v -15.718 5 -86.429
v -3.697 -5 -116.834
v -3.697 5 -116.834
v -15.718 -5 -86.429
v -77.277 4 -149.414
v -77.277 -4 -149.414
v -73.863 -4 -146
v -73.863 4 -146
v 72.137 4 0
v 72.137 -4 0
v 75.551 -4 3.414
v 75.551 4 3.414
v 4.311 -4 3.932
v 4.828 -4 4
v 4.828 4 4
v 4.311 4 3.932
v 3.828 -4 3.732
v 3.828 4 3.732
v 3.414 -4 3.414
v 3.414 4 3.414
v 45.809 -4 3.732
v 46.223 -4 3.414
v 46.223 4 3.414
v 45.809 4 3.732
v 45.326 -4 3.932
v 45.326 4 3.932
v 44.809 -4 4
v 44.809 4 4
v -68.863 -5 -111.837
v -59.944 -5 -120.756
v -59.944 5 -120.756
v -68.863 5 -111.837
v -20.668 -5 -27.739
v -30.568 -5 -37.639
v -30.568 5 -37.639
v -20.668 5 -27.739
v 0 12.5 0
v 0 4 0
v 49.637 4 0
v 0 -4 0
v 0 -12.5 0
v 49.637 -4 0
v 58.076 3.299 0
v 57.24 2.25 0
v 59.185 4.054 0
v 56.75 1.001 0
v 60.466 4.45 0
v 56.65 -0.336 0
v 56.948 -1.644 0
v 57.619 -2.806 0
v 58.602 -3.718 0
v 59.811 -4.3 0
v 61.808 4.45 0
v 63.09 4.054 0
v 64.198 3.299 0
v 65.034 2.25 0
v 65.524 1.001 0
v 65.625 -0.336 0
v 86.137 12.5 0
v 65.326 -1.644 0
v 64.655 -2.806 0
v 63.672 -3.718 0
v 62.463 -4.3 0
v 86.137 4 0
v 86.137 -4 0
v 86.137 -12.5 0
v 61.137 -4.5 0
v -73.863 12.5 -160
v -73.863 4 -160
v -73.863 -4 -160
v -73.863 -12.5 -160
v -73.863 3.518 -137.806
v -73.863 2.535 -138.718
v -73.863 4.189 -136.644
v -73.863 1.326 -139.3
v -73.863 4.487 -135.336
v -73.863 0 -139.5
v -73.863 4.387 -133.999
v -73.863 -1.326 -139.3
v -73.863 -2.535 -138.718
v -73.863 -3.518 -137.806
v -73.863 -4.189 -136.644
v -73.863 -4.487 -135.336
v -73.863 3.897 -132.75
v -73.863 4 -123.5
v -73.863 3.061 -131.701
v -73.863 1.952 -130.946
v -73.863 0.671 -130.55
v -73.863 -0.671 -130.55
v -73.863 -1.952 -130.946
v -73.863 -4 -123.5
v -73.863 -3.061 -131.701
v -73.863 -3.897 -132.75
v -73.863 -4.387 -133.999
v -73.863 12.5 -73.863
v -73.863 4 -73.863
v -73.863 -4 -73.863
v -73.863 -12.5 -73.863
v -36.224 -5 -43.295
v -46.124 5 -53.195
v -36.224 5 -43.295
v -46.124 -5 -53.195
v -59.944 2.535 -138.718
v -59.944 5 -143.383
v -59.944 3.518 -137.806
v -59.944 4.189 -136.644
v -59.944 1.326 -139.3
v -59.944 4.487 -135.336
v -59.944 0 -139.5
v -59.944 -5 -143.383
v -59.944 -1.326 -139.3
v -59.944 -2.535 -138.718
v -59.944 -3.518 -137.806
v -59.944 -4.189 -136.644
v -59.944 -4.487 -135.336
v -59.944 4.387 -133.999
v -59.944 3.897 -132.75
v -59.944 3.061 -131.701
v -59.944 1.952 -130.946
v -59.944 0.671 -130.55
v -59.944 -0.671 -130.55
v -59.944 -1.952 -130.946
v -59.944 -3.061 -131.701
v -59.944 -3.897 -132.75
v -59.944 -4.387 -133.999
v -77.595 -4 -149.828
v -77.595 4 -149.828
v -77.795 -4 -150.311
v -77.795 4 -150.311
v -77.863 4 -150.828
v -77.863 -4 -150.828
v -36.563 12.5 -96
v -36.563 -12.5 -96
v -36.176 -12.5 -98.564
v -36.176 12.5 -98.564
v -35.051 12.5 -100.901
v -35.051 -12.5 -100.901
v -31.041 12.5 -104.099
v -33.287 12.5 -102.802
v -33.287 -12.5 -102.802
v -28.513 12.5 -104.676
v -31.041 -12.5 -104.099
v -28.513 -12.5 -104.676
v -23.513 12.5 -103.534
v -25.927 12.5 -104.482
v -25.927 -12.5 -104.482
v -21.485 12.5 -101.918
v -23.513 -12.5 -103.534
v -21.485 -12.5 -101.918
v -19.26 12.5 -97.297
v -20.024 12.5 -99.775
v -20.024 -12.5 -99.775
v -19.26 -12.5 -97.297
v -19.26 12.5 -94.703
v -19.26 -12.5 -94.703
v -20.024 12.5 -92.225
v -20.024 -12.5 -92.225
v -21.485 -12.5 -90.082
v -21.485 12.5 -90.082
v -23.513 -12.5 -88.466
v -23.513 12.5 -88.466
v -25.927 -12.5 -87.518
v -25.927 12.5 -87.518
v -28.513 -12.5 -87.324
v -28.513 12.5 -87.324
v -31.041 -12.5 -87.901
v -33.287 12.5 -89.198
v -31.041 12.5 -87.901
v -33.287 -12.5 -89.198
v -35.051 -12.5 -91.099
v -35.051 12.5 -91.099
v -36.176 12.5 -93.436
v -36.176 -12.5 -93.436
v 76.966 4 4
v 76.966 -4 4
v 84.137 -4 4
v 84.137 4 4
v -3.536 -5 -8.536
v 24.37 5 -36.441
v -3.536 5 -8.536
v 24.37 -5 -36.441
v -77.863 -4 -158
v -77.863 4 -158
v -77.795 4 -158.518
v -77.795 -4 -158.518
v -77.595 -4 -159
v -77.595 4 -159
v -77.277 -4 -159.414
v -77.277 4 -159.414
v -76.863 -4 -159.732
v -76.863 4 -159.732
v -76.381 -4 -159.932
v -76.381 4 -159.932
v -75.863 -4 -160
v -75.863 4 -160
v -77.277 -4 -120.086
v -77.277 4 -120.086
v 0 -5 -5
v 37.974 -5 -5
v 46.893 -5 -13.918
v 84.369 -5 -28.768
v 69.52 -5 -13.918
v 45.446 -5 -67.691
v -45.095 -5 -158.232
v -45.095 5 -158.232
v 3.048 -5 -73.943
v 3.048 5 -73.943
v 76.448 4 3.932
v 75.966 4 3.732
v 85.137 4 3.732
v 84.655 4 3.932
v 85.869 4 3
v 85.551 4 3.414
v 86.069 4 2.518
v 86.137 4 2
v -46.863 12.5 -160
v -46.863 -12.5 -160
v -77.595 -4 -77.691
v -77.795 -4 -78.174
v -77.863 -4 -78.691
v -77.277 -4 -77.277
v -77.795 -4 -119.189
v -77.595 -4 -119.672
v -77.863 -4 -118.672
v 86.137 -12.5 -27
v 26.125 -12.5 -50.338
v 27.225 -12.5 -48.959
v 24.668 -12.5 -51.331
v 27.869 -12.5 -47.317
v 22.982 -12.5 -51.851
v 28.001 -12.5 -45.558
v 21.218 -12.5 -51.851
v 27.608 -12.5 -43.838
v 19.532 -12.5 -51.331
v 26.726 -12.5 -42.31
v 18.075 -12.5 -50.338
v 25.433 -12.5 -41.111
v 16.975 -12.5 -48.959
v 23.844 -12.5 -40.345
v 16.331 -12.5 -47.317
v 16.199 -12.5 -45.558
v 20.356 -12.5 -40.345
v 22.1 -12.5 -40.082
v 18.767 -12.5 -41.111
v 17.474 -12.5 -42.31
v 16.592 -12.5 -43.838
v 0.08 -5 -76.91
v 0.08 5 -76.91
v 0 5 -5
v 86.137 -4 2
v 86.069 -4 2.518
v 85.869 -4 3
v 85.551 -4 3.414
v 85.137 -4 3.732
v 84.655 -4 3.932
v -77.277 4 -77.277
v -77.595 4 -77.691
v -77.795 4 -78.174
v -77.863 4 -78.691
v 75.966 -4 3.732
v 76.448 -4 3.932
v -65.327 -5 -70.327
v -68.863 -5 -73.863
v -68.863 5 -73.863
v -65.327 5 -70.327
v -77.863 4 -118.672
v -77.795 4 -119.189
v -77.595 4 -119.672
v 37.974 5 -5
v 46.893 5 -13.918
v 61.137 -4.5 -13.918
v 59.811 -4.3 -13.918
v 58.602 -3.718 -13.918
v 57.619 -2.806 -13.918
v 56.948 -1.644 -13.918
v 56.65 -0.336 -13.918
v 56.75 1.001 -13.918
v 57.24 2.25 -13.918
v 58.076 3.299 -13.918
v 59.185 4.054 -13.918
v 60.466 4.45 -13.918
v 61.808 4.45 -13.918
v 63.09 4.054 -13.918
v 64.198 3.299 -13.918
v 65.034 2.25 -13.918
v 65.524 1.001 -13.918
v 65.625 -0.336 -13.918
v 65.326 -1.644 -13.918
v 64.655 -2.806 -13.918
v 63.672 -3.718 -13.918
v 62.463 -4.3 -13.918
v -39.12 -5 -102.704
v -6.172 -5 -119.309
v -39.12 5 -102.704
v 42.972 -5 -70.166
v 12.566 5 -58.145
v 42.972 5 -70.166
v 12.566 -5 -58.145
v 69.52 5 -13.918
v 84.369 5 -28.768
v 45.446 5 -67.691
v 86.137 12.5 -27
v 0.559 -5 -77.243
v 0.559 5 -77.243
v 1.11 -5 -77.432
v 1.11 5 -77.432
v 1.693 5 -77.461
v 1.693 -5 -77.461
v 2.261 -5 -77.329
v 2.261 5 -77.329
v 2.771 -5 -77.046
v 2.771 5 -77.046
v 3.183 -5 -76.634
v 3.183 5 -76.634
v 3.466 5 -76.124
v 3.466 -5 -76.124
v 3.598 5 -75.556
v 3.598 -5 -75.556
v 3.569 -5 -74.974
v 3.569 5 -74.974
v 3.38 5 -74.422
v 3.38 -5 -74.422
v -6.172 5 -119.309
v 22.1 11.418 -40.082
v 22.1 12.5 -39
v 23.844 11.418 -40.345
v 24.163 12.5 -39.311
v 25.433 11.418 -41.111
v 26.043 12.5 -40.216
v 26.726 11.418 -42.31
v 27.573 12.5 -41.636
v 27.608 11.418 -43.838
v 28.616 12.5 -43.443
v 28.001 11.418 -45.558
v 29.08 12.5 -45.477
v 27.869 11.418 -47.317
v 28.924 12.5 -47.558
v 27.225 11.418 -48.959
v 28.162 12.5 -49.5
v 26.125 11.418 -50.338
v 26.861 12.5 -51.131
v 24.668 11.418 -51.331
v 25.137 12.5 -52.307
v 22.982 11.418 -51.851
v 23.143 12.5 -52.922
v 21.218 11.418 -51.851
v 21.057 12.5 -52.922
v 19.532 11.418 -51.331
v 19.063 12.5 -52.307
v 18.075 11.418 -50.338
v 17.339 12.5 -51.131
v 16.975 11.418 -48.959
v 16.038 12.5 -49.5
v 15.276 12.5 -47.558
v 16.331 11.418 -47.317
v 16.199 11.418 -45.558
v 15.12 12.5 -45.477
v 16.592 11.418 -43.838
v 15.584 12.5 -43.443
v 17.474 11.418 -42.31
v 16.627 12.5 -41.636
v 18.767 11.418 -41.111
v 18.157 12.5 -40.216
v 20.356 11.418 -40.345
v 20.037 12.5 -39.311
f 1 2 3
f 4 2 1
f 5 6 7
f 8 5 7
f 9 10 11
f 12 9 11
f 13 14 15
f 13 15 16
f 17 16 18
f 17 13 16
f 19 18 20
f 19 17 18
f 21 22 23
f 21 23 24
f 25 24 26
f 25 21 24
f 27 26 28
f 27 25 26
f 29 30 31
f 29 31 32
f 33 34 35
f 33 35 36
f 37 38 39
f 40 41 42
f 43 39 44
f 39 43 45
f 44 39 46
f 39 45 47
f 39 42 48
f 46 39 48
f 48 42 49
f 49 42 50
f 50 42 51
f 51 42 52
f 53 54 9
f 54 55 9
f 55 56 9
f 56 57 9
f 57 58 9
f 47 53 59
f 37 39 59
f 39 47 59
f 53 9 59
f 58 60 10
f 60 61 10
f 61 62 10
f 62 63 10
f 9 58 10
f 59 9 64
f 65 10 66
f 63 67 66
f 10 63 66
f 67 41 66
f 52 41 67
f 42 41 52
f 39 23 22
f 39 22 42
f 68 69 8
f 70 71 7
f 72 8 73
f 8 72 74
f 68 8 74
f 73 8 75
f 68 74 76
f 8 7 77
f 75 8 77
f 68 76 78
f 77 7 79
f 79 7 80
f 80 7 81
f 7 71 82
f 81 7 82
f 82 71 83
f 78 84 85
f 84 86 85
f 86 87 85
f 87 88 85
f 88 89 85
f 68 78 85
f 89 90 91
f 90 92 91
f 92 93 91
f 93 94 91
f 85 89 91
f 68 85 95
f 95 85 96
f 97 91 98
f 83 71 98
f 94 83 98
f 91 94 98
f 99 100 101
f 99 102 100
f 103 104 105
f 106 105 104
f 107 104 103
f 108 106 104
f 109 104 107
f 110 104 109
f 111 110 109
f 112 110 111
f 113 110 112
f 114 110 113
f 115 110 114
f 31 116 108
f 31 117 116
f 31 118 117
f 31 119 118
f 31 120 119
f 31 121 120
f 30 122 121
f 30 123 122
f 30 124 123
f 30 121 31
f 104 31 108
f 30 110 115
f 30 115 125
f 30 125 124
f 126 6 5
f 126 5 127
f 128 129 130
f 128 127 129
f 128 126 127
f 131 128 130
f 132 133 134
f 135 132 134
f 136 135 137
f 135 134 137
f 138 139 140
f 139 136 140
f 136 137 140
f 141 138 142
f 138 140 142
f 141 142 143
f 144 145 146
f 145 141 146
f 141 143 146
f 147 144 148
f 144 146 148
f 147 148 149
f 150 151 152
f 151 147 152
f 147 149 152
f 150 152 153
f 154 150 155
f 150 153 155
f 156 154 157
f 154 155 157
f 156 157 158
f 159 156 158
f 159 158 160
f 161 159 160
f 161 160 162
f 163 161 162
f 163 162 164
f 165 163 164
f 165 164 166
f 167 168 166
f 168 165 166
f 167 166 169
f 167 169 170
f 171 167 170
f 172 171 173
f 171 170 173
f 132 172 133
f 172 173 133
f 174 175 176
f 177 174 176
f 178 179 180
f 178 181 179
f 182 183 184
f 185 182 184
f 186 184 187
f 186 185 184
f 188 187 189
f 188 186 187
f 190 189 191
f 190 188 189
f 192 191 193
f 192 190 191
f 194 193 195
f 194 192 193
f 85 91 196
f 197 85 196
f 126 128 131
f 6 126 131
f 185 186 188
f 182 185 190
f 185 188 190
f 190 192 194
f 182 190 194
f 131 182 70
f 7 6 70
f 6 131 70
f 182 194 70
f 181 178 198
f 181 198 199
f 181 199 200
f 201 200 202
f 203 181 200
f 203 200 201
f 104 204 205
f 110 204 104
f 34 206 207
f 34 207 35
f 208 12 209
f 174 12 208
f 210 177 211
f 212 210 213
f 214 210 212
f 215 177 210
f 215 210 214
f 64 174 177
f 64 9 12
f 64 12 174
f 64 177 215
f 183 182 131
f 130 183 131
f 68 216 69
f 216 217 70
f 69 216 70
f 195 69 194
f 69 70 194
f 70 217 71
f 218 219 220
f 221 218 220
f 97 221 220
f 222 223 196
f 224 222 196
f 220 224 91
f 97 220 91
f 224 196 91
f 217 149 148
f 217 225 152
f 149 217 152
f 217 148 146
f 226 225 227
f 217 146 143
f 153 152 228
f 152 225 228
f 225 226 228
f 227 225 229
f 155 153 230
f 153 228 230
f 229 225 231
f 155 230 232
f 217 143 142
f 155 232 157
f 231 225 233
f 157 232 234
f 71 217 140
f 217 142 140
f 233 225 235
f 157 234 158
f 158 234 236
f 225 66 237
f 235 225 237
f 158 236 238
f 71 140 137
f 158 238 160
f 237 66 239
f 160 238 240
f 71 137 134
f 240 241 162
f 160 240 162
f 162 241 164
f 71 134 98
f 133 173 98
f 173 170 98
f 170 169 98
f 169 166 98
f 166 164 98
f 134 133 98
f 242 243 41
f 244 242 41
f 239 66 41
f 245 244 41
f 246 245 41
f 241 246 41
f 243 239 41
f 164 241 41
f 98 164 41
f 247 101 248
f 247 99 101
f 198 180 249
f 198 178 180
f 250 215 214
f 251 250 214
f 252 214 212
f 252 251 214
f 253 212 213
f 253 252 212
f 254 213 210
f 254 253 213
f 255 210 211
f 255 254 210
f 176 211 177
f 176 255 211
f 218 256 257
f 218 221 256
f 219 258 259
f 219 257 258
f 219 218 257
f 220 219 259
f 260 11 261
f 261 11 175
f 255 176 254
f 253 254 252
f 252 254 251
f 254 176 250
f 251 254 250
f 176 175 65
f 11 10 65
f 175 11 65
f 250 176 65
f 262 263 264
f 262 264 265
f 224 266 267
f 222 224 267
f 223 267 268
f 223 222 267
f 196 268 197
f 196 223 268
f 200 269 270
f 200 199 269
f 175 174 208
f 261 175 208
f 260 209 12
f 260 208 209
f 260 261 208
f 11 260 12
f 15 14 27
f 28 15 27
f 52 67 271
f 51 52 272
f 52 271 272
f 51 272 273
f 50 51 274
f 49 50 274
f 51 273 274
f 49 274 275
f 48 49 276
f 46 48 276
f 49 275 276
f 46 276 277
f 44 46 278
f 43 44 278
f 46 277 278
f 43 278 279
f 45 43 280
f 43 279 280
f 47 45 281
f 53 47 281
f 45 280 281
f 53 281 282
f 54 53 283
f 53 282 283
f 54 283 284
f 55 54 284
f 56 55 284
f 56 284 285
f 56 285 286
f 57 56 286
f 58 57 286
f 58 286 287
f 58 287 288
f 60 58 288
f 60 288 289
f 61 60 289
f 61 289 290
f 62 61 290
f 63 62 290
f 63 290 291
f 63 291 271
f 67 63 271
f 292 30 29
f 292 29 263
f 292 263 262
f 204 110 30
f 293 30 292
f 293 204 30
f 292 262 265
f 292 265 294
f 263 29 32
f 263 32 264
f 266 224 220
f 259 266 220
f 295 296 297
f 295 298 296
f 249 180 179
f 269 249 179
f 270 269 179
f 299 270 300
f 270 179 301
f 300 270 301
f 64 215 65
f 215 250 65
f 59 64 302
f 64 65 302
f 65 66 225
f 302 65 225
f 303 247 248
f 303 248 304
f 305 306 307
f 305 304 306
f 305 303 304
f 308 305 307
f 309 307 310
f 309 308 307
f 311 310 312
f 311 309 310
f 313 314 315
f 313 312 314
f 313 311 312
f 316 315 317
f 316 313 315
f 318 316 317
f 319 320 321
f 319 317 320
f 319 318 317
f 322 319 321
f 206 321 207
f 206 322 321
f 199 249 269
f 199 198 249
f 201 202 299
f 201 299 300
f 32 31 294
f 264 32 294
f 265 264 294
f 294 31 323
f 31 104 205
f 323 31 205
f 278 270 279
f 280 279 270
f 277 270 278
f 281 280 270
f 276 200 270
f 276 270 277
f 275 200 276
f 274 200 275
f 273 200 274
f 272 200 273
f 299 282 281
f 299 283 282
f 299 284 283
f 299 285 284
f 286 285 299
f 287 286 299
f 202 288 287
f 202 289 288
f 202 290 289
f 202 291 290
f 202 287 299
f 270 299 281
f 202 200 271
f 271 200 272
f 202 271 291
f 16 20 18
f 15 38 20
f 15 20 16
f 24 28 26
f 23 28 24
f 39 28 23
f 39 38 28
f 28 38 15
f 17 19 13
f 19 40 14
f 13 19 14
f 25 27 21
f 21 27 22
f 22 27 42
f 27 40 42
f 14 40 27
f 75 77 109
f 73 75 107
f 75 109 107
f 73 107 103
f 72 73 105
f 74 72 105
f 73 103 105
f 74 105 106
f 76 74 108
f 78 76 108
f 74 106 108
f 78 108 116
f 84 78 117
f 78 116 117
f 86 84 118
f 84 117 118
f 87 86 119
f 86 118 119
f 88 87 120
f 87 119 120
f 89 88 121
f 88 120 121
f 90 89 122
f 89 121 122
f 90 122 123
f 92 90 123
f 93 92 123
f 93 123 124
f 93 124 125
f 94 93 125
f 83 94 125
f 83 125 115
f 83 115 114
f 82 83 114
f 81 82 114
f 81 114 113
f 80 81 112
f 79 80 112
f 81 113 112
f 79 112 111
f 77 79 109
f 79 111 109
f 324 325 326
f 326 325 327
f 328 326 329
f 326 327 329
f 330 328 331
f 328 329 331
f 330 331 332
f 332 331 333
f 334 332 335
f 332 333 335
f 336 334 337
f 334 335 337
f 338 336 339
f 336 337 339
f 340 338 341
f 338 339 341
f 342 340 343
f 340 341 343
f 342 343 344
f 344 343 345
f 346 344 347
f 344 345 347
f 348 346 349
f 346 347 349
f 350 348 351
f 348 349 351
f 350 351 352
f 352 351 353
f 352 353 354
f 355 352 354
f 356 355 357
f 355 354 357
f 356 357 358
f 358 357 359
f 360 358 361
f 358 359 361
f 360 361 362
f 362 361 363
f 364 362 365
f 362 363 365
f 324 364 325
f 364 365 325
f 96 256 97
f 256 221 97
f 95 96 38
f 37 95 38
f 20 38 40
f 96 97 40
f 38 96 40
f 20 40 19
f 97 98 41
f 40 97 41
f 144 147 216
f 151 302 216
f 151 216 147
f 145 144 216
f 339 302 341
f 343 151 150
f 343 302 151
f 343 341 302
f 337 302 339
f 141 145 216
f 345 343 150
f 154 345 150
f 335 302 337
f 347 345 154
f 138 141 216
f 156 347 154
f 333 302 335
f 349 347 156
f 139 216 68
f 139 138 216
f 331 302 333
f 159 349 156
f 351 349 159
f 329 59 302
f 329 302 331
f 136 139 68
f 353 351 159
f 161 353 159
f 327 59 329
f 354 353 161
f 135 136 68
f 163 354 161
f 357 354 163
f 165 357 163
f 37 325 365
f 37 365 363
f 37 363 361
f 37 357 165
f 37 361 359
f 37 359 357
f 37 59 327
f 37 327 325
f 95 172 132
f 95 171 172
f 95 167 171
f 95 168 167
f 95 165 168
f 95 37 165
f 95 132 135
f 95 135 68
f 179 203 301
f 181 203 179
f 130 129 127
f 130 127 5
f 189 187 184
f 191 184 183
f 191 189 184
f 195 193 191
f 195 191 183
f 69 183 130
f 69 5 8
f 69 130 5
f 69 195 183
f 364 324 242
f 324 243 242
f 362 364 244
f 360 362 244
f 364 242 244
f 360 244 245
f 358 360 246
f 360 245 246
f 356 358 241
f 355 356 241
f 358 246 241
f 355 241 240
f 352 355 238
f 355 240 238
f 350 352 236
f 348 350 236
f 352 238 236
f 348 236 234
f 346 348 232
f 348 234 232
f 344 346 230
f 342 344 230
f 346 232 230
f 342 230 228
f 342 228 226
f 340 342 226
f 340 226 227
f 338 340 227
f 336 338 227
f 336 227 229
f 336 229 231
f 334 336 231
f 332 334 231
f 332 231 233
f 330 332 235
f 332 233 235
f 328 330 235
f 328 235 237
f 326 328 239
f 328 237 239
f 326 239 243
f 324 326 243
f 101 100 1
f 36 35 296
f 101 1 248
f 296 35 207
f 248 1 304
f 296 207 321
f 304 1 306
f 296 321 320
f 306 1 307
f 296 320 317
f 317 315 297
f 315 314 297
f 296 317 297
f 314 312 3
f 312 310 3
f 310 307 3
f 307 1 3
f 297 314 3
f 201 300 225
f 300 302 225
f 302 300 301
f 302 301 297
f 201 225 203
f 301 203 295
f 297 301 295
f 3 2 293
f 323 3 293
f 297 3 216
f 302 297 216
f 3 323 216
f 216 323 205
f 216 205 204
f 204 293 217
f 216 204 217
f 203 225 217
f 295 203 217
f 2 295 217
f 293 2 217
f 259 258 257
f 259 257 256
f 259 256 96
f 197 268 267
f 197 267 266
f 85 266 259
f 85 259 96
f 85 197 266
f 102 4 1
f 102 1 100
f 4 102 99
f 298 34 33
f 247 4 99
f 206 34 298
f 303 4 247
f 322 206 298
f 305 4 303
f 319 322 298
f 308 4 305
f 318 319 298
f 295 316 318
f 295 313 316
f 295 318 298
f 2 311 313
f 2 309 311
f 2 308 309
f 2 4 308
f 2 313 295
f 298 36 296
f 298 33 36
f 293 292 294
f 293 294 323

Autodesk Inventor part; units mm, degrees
sketch "Skizze_1" plane through (0, 0, 0) normal (0, 1, 0) x (-1, 0, 0)
  line L0 (73.8629, -73.8629) -> (0, 0)
  line L1 (0, 0) -> (-86.1371, 0)
  line L2 (-86.1371, 0) -> (-86.1371, -27)
  line L3 (-86.1371, -27) -> (46.8629, -160)
  line L4 (46.8629, -160) -> (73.8629, -160)
  line L5 (73.8629, -160) -> (73.8629, -73.8629)
  circle A0 centre (27.8629, -96) radius 8.7
extrude "Extrusion1" add sketch "Skizze_1" along normal mid plane 25
sketch "Skizze_2" plane through (0, 0, 0) normal (0, 1, 0) x (1, 0, 0)
  line L0 (72.1371, 0) -> (75.5513, -3.4142)
  arc A0 (75.5513, -3.4142) -> (76.9655, -4) centre (76.9655, -2) ccw
  line L1 (76.9655, -4) -> (84.1371, -4)
  arc A1 (84.1371, -4) -> (86.1371, -2) centre (84.1371, -2) ccw
  line L2 (86.1371, -2) -> (86.1371, 0)
  line L3 (86.1371, 0) -> (72.1371, 0)
extrude "Extrusion2" add sketch "Skizze_2" along normal mid plane 8
sketch "Skizze_3" plane through (0, 0, 0) normal (0, 1, 0) x (1, 0, 0)
  line L0 (0, 0) -> (3.4142, -3.4142)
  arc A0 (3.4142, -3.4142) -> (4.8284, -4) centre (4.8284, -2) ccw
  line L1 (4.8284, -4) -> (44.8087, -4)
  arc A1 (44.8087, -4) -> (46.2229, -3.4142) centre (44.8087, -2) ccw
  line L2 (46.2229, -3.4142) -> (49.6371, 0)
  line L3 (49.6371, 0) -> (0, 0)
extrude "Extrusion3" add sketch "Skizze_3" along normal mid plane 8
sketch "Skizze_4" plane through (0, 0, 0) normal (0, 1, 0) x (1, 0, 0)
  arc A0 (-77.8629, 150.8284) -> (-77.2771, 149.4142) centre (-75.8629, 150.8284) ccw
  line L0 (-77.2771, 149.4142) -> (-73.8629, 146)
  line L1 (-73.8629, 146) -> (-73.8629, 160)
  line L2 (-73.8629, 160) -> (-75.8629, 160)
  arc A1 (-75.8629, 160) -> (-77.8629, 158) centre (-75.8629, 158) ccw
  line L3 (-77.8629, 158) -> (-77.8629, 150.8284)
extrude "Extrusion4" add sketch "Skizze_4" along normal mid plane 8
sketch "Skizze_5" plane through (0, 0, 0) normal (0, 1, 0) x (1, 0, 0)
  line L0 (-77.8629, 118.6716) -> (-77.8629, 78.6913)
  arc A0 (-77.8629, 78.6913) -> (-77.2771, 77.2771) centre (-75.8629, 78.6913) ccw
  line L1 (-77.2771, 77.2771) -> (-73.8629, 73.8629)
  line L2 (-73.8629, 73.8629) -> (-73.8629, 123.5)
  line L3 (-73.8629, 123.5) -> (-77.2771, 120.0858)
  arc A1 (-77.2771, 120.0858) -> (-77.8629, 118.6716) centre (-75.8629, 118.6716) ccw
extrude "Extrusion5" add sketch "Skizze_5" along normal mid plane 8
sketch "Sketch6" plane through (0, -12.5, 0) normal (0, 0, 1) x (1, 0, 0)
  point P0 (61.1371, 12.5)
hole "Drilling 1" at (61.1371, 0, 0) direction (0, 0, -1) diameter 9 depth 92.3404
sketch "Skizze_7" plane through (0, 0, 0) normal (0, 1, 0) x (1, 0, 0)
  line L0 (50, 135) -> (-50, 135)
  line L1 (-73.8629, 135) -> (-73.8629, 139.5)
  line L2 (-73.8629, 139.5) -> (0, 139.5)
  line L3 (0, 139.5) -> (0, 135)
  line L4 (0, 135) -> (-73.8629, 135)
revolve "Revolution1" cut sketch "Skizze_7" angle 360 about axis through (50, 0, -135) along (1, 0, 0)
sketch "Skizze_8" plane through (0, 0, 0) normal (0, 1, 0) x (1, 0, 0)
  line L0 (-46.1238, 53.1949) -> (-36.2244, 43.2954)
  line L1 (-36.2244, 43.2954) -> (0.0798, 76.9104)
  arc A0 (3.0475, 73.9428) -> (0.0798, 76.9104) centre (1.5066, 75.3695) ccw
  line L2 (3.0475, 73.9428) -> (-30.5675, 37.6386)
  line L3 (-30.5675, 37.6386) -> (-20.668, 27.7391)
  line L4 (-20.668, 27.7391) -> (12.566, 58.1447)
  line L5 (12.566, 58.1447) -> (42.9716, 70.1655)
  line L6 (42.9716, 70.1655) -> (-3.6974, 116.8345)
  line L7 (-3.6974, 116.8345) -> (-15.7183, 86.4289)
  line L8 (-15.7183, 86.4289) -> (-46.1238, 53.1949)
extrude "Extrusion6" cut sketch "Skizze_8" along normal mid plane 10
sketch "Sketch9" plane through (0, 12.5, 0) normal (0, 1, 0) x (1, 0, 0)
  point P0 (22.1, 46)
hole "Drilling 3" at (22.1, 12.5, -46) direction (0, -1, 0) diameter 11.835 depth 25 countersink diameter 14 countersink angle 90 thread size "M14x2" class "6H" standard "ISO Metric profile"
sketch "Skizze_10" plane through (0, 0, 0) normal (0, 1, 0) x (1, 0, 0)
  line L0 (-3.5355, 8.5355) -> (0, 5)
  line L1 (0, 5) -> (37.9741, 5)
  line L2 (37.9741, 5) -> (46.8927, 13.9185)
  line L3 (46.8927, 13.9185) -> (69.5201, 13.9185)
  line L4 (69.5201, 13.9185) -> (84.3693, 28.7678)
  line L5 (84.3693, 28.7678) -> (45.4465, 67.6906)
  line L6 (45.4465, 67.6906) -> (24.3701, 36.4411)
  line L7 (24.3701, 36.4411) -> (-3.5355, 8.5355)
extrude "Extrusion7" cut sketch "Skizze_10" along normal mid plane 10
sketch "Skizze_11" plane through (0, 0, 0) normal (0, 1, 0) x (1, 0, 0)
  line L0 (-68.8629, 73.8629) -> (-65.3274, 70.3274)
  line L1 (-65.3274, 70.3274) -> (-39.1198, 102.7044)
  line L2 (-39.1198, 102.7044) -> (-6.1723, 119.3094)
  line L3 (-6.1723, 119.3094) -> (-45.0951, 158.2322)
  line L4 (-45.0951, 158.2322) -> (-59.9444, 143.383)
  line L5 (-59.9444, 143.383) -> (-59.9444, 120.7556)
  line L6 (-59.9444, 120.7556) -> (-68.8629, 111.837)
  line L7 (-68.8629, 111.837) -> (-68.8629, 73.8629)
extrude "Extrusion8" cut sketch "Skizze_11" along normal mid plane 10
ref_plane "side_2a_XY" through (61.137, 0, 0) normal (0, 0, 1) x (1, 0, 0)
ref_plane "side_2a_YZ" through (61.137, 0, 0) normal (1, 0, 0) x (0, 1, 0)
ref_plane "side_2a_ZX" through (61.137, 0, 0) normal (0, 1, 0) x (0, 0, 1)
ref_plane "side_2b_XY" through (61.137, 0, -13.919) normal (0, 0, -1) x (1, 0, 0)
ref_plane "side_2b_YZ" through (61.137, 0, -13.919) normal (1, 0, 0) x (0, -1, 0)
ref_plane "side_2b_ZX" through (61.137, 0, -13.919) normal (0, -1, 0) x (0, 0, -1)
ref_plane "side_5a_XY" through (-73.863, 0, -135) normal (-1, 0, 0) x (0, 0, -1)
ref_plane "side_5a_YZ" through (-73.863, 0, -135) normal (0, 0, -1) x (0, -1, 0)
ref_plane "side_5a_ZX" through (-73.863, 0, -135) normal (0, -1, 0) x (-1, 0, 0)
ref_plane "side_5b_XY" through (-59.944, 0, -135) normal (1, 0, 0) x (0, 0, -1)
ref_plane "side_5b_YZ" through (-59.944, 0, -135) normal (0, 0, -1) x (0, 1, 0)
ref_plane "side_5b_ZX" through (-59.944, 0, -135) normal (0, 1, 0) x (1, 0, 0)
ref_plane "side_1a_XY" through (22.137, 12, -46) normal (0, 1, 0) x (1, 0, 0)
ref_plane "side_1a_YZ" through (22.137, 12, -46) normal (1, 0, 0) x (0, 0, -1)
ref_plane "side_1a_ZX" through (22.137, 12, -46) normal (0, 0, -1) x (0, 1, 0)
ref_plane "side_1b_XY" through (-27.863, 12, -96) normal (0, 1, 0) x (1, 0, 0)
ref_plane "side_1b_YZ" through (-27.863, 12, -96) normal (1, 0, 0) x (0, 0, -1)
ref_plane "side_1b_ZX" through (-27.863, 12, -96) normal (0, 0, -1) x (0, 1, 0)
ref_plane "side_6a_XY" through (22.137, -12, -46) normal (0, -1, 0) x (1, 0, 0)
ref_plane "side_6a_YZ" through (22.137, -12, -46) normal (1, 0, 0) x (0, 0, 1)
ref_plane "side_6a_ZX" through (22.137, -12, -46) normal (0, 0, 1) x (0, -1, 0)
ref_plane "side_6b_XY" through (-27.863, -12, -96) normal (0, -1, 0) x (1, 0, 0)
ref_plane "side_6b_YZ" through (-27.863, -12, -96) normal (1, 0, 0) x (0, 0, 1)
ref_plane "side_6b_ZX" through (-27.863, -12, -96) normal (0, 0, 1) x (0, -1, 0)
properties part number "May Tec 1.47.225160.2_Floor mounting plate_schwarz-Pulverbeschichtet"
